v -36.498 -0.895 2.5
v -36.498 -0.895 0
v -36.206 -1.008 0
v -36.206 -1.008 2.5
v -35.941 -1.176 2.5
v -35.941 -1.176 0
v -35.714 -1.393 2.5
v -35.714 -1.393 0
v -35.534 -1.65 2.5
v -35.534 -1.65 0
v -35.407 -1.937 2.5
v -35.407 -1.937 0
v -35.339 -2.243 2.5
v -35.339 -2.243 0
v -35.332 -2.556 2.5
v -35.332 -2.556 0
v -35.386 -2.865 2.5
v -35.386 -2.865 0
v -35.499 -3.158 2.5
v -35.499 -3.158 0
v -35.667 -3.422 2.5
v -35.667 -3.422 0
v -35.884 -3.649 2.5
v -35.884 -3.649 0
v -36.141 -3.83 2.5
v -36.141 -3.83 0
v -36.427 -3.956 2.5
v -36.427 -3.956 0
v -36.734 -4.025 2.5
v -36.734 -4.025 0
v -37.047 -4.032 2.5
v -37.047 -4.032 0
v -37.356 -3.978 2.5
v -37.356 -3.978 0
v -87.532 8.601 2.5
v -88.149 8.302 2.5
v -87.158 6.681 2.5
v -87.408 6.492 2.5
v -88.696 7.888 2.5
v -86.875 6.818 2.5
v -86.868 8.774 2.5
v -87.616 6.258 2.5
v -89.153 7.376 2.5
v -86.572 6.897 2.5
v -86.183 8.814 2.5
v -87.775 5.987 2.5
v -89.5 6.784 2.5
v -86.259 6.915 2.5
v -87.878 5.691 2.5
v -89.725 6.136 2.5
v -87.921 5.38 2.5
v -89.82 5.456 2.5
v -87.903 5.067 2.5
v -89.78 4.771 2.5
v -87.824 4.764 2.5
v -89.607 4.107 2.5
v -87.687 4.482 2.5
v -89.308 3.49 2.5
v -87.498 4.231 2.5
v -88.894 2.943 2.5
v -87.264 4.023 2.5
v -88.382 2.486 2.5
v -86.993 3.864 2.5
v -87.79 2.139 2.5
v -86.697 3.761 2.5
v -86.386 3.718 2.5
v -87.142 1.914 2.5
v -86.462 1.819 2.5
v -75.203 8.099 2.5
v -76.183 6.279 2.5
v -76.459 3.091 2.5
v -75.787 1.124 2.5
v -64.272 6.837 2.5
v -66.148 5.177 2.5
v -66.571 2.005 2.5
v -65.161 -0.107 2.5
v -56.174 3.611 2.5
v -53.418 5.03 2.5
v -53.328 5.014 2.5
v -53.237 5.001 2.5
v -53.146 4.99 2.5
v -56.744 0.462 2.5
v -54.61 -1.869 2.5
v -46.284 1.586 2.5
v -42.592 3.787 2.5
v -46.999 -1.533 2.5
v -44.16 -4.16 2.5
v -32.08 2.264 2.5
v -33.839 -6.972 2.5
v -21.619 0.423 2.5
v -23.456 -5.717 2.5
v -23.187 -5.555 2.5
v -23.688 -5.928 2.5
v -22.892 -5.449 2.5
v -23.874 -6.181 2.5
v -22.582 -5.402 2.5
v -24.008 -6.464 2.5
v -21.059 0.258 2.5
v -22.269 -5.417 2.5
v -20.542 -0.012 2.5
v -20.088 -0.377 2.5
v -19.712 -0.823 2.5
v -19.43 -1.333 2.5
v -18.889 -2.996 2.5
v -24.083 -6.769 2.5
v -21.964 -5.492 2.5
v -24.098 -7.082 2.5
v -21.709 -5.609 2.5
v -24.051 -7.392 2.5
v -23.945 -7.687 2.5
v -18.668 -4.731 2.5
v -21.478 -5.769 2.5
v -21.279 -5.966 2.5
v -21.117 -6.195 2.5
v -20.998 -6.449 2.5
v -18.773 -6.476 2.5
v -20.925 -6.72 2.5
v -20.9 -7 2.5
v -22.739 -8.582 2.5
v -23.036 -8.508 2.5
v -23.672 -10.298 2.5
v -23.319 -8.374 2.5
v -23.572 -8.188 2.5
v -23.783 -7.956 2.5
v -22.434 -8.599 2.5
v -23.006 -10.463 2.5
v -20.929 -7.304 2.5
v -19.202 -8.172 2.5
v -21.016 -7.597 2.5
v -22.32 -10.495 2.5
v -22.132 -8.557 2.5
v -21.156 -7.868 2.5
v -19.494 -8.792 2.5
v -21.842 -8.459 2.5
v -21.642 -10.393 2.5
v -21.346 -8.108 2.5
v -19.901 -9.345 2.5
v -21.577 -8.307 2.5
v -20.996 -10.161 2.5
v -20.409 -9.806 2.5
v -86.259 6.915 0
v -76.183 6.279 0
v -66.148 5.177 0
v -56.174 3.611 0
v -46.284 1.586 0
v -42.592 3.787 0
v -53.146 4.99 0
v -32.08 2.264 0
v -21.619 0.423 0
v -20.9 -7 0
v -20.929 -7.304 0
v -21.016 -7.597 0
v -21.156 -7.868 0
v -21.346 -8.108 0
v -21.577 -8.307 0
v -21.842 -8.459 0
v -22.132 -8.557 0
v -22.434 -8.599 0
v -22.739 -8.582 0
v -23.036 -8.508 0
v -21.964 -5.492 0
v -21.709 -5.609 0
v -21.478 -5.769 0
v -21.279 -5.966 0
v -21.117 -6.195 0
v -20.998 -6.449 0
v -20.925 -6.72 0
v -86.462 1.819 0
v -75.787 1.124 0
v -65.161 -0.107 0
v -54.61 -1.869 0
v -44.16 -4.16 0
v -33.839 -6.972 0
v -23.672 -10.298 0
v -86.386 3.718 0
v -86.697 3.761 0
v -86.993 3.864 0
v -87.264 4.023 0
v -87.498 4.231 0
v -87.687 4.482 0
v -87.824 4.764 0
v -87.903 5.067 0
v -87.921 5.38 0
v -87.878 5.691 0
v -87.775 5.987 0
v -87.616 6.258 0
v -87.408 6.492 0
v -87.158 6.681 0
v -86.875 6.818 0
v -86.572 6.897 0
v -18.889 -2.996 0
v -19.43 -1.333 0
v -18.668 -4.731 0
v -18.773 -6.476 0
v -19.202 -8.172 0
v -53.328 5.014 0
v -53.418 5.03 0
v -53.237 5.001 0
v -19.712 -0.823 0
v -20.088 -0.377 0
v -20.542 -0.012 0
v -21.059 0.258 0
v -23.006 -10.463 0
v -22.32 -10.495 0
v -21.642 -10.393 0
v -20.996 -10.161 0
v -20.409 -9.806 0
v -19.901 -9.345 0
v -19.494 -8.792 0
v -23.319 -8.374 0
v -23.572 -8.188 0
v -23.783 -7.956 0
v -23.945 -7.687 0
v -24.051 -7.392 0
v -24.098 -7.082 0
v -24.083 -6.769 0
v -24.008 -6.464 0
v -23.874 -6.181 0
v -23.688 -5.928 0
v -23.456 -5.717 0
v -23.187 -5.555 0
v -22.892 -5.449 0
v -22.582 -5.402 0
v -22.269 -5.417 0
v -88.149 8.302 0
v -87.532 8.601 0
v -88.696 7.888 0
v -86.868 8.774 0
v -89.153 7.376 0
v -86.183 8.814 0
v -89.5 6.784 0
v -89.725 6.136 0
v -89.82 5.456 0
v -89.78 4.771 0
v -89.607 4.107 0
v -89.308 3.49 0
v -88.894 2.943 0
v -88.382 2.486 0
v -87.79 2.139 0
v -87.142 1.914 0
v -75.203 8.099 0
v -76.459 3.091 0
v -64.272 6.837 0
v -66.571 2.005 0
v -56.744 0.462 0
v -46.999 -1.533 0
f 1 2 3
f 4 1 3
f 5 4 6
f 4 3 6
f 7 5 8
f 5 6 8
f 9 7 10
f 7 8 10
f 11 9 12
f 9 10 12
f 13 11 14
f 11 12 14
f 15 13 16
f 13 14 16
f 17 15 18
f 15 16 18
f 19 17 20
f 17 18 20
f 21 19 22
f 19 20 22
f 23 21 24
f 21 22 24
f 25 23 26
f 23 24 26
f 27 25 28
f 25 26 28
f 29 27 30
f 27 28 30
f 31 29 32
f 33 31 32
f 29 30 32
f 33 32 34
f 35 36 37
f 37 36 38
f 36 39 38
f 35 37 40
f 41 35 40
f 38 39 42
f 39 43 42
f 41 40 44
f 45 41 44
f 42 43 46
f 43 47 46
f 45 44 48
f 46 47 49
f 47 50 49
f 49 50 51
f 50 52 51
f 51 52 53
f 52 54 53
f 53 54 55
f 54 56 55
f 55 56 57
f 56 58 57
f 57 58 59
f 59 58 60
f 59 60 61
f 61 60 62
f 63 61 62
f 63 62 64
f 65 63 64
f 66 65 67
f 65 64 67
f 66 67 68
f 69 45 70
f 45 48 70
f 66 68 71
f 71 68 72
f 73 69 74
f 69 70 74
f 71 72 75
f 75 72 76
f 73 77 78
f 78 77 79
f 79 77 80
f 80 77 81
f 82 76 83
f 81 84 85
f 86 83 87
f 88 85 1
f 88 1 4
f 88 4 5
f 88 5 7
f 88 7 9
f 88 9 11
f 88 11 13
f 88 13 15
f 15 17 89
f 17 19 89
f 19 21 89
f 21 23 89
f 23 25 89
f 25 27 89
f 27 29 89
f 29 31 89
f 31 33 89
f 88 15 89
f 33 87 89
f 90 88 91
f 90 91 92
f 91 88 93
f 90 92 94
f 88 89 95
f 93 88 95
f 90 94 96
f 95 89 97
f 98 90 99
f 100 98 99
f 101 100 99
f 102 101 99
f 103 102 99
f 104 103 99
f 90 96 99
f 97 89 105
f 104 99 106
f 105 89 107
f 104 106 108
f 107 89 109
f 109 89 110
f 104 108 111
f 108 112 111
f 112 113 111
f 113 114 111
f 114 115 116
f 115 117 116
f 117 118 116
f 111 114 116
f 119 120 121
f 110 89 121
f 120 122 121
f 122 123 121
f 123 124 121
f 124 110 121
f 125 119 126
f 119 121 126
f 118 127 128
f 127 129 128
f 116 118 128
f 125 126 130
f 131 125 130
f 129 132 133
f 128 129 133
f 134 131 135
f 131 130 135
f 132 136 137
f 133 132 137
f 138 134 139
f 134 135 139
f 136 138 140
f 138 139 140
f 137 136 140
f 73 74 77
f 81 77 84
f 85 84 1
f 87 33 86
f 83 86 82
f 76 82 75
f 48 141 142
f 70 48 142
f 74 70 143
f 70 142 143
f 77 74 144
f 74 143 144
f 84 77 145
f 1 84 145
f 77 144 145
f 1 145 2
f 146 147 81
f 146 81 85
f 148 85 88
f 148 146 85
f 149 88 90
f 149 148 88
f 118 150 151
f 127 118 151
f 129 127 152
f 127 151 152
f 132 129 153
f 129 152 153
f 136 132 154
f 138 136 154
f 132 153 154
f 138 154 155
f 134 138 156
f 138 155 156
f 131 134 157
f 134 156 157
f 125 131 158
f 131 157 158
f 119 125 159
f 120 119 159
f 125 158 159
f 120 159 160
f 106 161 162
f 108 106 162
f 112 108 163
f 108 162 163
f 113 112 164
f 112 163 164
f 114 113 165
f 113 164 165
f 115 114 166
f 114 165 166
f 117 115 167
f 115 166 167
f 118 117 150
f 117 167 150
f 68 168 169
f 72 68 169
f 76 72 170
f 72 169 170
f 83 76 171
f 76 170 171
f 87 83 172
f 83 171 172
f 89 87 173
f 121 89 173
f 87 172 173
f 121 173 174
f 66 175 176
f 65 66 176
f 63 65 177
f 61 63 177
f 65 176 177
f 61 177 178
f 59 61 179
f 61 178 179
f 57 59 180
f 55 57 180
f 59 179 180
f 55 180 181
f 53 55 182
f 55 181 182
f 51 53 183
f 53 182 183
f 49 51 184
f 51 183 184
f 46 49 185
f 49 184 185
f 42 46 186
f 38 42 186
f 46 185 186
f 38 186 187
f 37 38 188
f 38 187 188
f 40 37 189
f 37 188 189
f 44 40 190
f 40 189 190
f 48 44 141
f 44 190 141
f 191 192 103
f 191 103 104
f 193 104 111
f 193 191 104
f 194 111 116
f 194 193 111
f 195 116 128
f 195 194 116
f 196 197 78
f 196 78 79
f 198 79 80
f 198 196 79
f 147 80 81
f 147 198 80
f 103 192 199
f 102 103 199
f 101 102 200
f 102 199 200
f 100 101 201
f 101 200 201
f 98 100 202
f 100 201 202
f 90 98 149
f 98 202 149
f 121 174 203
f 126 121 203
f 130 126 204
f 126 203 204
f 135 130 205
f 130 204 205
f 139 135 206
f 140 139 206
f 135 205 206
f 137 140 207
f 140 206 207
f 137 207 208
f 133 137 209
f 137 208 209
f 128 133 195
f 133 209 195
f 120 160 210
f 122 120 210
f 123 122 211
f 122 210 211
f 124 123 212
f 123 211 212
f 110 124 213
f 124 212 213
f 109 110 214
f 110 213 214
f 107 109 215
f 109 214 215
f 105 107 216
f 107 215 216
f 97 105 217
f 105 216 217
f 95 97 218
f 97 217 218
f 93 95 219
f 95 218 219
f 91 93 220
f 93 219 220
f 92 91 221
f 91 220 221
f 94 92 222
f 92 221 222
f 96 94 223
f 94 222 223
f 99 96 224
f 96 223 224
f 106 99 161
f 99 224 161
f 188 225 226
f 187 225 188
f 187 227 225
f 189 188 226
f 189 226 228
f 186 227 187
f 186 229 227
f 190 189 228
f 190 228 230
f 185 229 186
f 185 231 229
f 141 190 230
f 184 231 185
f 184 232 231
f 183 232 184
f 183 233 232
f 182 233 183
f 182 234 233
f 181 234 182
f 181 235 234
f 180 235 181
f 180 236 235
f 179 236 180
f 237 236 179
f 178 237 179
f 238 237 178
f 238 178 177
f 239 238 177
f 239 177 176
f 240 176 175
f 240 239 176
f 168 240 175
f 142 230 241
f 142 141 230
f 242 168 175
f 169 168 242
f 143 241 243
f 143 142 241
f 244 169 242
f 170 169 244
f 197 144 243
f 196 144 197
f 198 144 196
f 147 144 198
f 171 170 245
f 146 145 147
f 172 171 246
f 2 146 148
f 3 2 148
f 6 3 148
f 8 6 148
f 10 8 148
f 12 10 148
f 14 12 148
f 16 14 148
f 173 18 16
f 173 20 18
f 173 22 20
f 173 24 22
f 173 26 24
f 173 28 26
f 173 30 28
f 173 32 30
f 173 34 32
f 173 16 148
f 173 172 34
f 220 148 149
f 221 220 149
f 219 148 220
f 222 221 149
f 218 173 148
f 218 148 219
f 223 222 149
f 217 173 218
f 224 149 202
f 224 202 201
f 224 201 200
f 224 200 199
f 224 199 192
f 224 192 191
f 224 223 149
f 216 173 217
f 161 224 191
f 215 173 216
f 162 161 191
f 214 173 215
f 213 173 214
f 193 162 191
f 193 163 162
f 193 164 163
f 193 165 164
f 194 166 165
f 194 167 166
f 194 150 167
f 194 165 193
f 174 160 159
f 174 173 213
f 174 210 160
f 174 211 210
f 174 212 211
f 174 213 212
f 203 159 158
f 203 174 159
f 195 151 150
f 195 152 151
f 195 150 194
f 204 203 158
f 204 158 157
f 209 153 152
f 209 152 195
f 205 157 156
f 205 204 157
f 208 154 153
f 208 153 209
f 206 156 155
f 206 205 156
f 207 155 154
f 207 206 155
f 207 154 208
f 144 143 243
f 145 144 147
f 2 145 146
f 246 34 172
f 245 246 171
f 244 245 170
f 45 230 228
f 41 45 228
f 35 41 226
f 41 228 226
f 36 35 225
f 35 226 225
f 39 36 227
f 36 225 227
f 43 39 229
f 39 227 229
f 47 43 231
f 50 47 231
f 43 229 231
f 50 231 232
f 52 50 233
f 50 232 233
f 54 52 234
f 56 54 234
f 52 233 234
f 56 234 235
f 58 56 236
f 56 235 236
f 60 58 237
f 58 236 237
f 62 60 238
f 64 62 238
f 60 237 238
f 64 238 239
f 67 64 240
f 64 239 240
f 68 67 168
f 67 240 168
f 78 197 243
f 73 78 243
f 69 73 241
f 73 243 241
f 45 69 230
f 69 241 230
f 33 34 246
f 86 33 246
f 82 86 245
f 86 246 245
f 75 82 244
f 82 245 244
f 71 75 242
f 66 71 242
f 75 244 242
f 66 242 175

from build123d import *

# Parameters (mm, degrees)
BOSS_EXTRUDE1_DEPTH = 2.5
BOSS_EXTRUDE2_DEPTH = 2.5
FILLET1_R           = 3


with BuildPart() as part:
    # Sketch1 → Boss-Extrude1 (new body)
    with BuildSketch(Plane.XY):
        with BuildLine():
            ThreePointArc((-36.498211921, -0.894837407), (-30.682272217, -2.600735992), (-24.91598031, -4.467584206))
            ThreePointArc((-24.91598031, -4.467584206), (-23.230561506, -3.577090815), (-21.328447916, -3.701906342))
            ThreePointArc((-21.328447916, -3.701906342), (-53.283170108, 5.003711479), (-86.182644365, 8.813783084))
            ThreePointArc((-86.182644365, 8.813783084), (-89.819650793, 5.456375715), (-86.462243424, 1.819369287))
            ThreePointArc((-86.462243424, 1.819369287), (-54.60957062, -1.869472767), (-23.671589589, -10.298093658))
            ThreePointArc((-23.671589589, -10.298093658), (-25.210339365, -9.214534302), (-25.965452096, -7.490684972))
            ThreePointArc((-25.965452096, -7.490684972), (-31.636424249, -5.655196046), (-37.356120498, -3.977692071))
            ThreePointArc((-37.356120498, -3.977692071), (-61.648333057, 1.290252949), (-86.386352251, 3.717853032))
            ThreePointArc((-86.386352251, 3.717853032), (-87.921167048, 5.380484542), (-86.258535538, 6.915299339))
            ThreePointArc((-86.258535538, 6.915299339), (-61.152151238, 4.451550721), (-36.498211921, -0.894837407))
        make_face()
        with BuildLine():
            ThreePointArc((-21.964443513, -5.492300042), (-21.192937962, -6.077210854), (-20.900018752, -7))
            ThreePointArc((-20.900018752, -7), (-21.577229606, -8.30708079), (-23.035593992, -8.507699958))
            ThreePointArc((-23.035593992, -8.507699958), (-24.498688375, -7.993907076), (-25.965452096, -7.490684972))
            ThreePointArc((-25.965452096, -7.490684972), (-25.210339365, -9.214534302), (-23.671589589, -10.298093658))
            ThreePointArc((-23.671589589, -10.298093658), (-20.481417495, -9.859239228), (-19.000018752, -7))
            ThreePointArc((-19.000018752, -7), (-19.640779524, -4.981398743), (-21.328447916, -3.701906342))
            ThreePointArc((-21.328447916, -3.701906342), (-23.230561506, -3.577090815), (-24.91598031, -4.467584206))
            ThreePointArc((-24.91598031, -4.467584206), (-23.438376962, -4.974656833), (-21.964443513, -5.492300042))
        make_face()
        with BuildLine():
            ThreePointArc((-23.035593992, -8.507699958), (-24.00771871, -6.46442476), (-21.964443513, -5.492300042))
            ThreePointArc((-21.964443513, -5.492300042), (-23.438376962, -4.974656833), (-24.91598031, -4.467584206))
            ThreePointArc((-24.91598031, -4.467584206), (-25.806449767, -5.852169897), (-25.965452096, -7.490684972))
            ThreePointArc((-25.965452096, -7.490684972), (-24.498688375, -7.993907076), (-23.035593992, -8.507699958))
        make_face()
        with BuildLine():
            ThreePointArc((-25.965452096, -7.490684972), (-25.806449767, -5.852169897), (-24.91598031, -4.467584206))
            ThreePointArc((-24.91598031, -4.467584206), (-30.682272217, -2.600735992), (-36.498211921, -0.894837407))
            ThreePointArc((-36.498211921, -0.894837407), (-35.385738878, -2.865219027), (-37.356120498, -3.977692071))
            ThreePointArc((-37.356120498, -3.977692071), (-31.636424249, -5.655196046), (-25.965452096, -7.490684972))
        make_face()
    extrude(amount=BOSS_EXTRUDE1_DEPTH)

    # Sketch2 → Boss-Extrude2 (add)
    with BuildSketch(Plane(origin=(0, 0, 0), x_dir=(-1, 0, 0), z_dir=(0, 0, -1))):
        with BuildLine():
            ThreePointArc((53.283170108, 5.003711479), (36.704107241, 2.974392367), (20.240739247, 0.156418643))
            ThreePointArc((20.240739247, 0.156418643), (18.734449346, -3.884474615), (19.201925094, -8.171570836))
            ThreePointArc((19.201925094, -8.171570836), (19.339488679, -5.496321293), (21.328447916, -3.701906342))
            ThreePointArc((21.328447916, -3.701906342), (37.141755573, 1.253074886), (53.283170108, 5.003711479))
        make_face()
    extrude(amount=-BOSS_EXTRUDE2_DEPTH)

    # Fillet1
    # the kernel refuses this fillet: 3 mm, written as the material it adds along each edge
    with BuildSketch(Plane(origin=(-53.283170108, 5.003711479, 0), x_dir=(-0.9819426110261866, 0.1891790386144179, 0), z_dir=(0, 0, 1))) as fillet1_piece_1:
        with BuildLine():
            CenterArc((0.138392848, -2.999999854), FILLET1_R, 90.017899156, 5.253257813)
            ThreePointArc((-0.137215119, -0.012686638), (-0.068606935, -0.006350072), (0, 0))
            ThreePointArc((0, 0), (0.068727825, -1.0735e-05), (0.13745565, 0))
        make_face()
    extrude(amount=2.5)
    # the kernel refuses this fillet: 3 mm, written as the material it takes off along each edge
    with BuildSketch(Plane(origin=(-20.240739247, 0.156418643, -4.239797149), x_dir=(0.4782853989003676, -0.8782044620694638, 0), z_dir=(0, 0, 1))) as fillet1_2_piece_1:
        with BuildLine():
            CenterArc((1.423846315, -2.987637282), FILLET1_R, 84.796647689, 55.779400765)
            ThreePointArc((-0.893558187, -1.082476824), (-0.447321739, -0.540790471), (0, 0))
            ThreePointArc((0, 0), (0.84795943, 0.03853047), (1.69591886, 0))
        make_face()
    extrude(amount=10.979594298, mode=Mode.SUBTRACT)


solid = part.part
